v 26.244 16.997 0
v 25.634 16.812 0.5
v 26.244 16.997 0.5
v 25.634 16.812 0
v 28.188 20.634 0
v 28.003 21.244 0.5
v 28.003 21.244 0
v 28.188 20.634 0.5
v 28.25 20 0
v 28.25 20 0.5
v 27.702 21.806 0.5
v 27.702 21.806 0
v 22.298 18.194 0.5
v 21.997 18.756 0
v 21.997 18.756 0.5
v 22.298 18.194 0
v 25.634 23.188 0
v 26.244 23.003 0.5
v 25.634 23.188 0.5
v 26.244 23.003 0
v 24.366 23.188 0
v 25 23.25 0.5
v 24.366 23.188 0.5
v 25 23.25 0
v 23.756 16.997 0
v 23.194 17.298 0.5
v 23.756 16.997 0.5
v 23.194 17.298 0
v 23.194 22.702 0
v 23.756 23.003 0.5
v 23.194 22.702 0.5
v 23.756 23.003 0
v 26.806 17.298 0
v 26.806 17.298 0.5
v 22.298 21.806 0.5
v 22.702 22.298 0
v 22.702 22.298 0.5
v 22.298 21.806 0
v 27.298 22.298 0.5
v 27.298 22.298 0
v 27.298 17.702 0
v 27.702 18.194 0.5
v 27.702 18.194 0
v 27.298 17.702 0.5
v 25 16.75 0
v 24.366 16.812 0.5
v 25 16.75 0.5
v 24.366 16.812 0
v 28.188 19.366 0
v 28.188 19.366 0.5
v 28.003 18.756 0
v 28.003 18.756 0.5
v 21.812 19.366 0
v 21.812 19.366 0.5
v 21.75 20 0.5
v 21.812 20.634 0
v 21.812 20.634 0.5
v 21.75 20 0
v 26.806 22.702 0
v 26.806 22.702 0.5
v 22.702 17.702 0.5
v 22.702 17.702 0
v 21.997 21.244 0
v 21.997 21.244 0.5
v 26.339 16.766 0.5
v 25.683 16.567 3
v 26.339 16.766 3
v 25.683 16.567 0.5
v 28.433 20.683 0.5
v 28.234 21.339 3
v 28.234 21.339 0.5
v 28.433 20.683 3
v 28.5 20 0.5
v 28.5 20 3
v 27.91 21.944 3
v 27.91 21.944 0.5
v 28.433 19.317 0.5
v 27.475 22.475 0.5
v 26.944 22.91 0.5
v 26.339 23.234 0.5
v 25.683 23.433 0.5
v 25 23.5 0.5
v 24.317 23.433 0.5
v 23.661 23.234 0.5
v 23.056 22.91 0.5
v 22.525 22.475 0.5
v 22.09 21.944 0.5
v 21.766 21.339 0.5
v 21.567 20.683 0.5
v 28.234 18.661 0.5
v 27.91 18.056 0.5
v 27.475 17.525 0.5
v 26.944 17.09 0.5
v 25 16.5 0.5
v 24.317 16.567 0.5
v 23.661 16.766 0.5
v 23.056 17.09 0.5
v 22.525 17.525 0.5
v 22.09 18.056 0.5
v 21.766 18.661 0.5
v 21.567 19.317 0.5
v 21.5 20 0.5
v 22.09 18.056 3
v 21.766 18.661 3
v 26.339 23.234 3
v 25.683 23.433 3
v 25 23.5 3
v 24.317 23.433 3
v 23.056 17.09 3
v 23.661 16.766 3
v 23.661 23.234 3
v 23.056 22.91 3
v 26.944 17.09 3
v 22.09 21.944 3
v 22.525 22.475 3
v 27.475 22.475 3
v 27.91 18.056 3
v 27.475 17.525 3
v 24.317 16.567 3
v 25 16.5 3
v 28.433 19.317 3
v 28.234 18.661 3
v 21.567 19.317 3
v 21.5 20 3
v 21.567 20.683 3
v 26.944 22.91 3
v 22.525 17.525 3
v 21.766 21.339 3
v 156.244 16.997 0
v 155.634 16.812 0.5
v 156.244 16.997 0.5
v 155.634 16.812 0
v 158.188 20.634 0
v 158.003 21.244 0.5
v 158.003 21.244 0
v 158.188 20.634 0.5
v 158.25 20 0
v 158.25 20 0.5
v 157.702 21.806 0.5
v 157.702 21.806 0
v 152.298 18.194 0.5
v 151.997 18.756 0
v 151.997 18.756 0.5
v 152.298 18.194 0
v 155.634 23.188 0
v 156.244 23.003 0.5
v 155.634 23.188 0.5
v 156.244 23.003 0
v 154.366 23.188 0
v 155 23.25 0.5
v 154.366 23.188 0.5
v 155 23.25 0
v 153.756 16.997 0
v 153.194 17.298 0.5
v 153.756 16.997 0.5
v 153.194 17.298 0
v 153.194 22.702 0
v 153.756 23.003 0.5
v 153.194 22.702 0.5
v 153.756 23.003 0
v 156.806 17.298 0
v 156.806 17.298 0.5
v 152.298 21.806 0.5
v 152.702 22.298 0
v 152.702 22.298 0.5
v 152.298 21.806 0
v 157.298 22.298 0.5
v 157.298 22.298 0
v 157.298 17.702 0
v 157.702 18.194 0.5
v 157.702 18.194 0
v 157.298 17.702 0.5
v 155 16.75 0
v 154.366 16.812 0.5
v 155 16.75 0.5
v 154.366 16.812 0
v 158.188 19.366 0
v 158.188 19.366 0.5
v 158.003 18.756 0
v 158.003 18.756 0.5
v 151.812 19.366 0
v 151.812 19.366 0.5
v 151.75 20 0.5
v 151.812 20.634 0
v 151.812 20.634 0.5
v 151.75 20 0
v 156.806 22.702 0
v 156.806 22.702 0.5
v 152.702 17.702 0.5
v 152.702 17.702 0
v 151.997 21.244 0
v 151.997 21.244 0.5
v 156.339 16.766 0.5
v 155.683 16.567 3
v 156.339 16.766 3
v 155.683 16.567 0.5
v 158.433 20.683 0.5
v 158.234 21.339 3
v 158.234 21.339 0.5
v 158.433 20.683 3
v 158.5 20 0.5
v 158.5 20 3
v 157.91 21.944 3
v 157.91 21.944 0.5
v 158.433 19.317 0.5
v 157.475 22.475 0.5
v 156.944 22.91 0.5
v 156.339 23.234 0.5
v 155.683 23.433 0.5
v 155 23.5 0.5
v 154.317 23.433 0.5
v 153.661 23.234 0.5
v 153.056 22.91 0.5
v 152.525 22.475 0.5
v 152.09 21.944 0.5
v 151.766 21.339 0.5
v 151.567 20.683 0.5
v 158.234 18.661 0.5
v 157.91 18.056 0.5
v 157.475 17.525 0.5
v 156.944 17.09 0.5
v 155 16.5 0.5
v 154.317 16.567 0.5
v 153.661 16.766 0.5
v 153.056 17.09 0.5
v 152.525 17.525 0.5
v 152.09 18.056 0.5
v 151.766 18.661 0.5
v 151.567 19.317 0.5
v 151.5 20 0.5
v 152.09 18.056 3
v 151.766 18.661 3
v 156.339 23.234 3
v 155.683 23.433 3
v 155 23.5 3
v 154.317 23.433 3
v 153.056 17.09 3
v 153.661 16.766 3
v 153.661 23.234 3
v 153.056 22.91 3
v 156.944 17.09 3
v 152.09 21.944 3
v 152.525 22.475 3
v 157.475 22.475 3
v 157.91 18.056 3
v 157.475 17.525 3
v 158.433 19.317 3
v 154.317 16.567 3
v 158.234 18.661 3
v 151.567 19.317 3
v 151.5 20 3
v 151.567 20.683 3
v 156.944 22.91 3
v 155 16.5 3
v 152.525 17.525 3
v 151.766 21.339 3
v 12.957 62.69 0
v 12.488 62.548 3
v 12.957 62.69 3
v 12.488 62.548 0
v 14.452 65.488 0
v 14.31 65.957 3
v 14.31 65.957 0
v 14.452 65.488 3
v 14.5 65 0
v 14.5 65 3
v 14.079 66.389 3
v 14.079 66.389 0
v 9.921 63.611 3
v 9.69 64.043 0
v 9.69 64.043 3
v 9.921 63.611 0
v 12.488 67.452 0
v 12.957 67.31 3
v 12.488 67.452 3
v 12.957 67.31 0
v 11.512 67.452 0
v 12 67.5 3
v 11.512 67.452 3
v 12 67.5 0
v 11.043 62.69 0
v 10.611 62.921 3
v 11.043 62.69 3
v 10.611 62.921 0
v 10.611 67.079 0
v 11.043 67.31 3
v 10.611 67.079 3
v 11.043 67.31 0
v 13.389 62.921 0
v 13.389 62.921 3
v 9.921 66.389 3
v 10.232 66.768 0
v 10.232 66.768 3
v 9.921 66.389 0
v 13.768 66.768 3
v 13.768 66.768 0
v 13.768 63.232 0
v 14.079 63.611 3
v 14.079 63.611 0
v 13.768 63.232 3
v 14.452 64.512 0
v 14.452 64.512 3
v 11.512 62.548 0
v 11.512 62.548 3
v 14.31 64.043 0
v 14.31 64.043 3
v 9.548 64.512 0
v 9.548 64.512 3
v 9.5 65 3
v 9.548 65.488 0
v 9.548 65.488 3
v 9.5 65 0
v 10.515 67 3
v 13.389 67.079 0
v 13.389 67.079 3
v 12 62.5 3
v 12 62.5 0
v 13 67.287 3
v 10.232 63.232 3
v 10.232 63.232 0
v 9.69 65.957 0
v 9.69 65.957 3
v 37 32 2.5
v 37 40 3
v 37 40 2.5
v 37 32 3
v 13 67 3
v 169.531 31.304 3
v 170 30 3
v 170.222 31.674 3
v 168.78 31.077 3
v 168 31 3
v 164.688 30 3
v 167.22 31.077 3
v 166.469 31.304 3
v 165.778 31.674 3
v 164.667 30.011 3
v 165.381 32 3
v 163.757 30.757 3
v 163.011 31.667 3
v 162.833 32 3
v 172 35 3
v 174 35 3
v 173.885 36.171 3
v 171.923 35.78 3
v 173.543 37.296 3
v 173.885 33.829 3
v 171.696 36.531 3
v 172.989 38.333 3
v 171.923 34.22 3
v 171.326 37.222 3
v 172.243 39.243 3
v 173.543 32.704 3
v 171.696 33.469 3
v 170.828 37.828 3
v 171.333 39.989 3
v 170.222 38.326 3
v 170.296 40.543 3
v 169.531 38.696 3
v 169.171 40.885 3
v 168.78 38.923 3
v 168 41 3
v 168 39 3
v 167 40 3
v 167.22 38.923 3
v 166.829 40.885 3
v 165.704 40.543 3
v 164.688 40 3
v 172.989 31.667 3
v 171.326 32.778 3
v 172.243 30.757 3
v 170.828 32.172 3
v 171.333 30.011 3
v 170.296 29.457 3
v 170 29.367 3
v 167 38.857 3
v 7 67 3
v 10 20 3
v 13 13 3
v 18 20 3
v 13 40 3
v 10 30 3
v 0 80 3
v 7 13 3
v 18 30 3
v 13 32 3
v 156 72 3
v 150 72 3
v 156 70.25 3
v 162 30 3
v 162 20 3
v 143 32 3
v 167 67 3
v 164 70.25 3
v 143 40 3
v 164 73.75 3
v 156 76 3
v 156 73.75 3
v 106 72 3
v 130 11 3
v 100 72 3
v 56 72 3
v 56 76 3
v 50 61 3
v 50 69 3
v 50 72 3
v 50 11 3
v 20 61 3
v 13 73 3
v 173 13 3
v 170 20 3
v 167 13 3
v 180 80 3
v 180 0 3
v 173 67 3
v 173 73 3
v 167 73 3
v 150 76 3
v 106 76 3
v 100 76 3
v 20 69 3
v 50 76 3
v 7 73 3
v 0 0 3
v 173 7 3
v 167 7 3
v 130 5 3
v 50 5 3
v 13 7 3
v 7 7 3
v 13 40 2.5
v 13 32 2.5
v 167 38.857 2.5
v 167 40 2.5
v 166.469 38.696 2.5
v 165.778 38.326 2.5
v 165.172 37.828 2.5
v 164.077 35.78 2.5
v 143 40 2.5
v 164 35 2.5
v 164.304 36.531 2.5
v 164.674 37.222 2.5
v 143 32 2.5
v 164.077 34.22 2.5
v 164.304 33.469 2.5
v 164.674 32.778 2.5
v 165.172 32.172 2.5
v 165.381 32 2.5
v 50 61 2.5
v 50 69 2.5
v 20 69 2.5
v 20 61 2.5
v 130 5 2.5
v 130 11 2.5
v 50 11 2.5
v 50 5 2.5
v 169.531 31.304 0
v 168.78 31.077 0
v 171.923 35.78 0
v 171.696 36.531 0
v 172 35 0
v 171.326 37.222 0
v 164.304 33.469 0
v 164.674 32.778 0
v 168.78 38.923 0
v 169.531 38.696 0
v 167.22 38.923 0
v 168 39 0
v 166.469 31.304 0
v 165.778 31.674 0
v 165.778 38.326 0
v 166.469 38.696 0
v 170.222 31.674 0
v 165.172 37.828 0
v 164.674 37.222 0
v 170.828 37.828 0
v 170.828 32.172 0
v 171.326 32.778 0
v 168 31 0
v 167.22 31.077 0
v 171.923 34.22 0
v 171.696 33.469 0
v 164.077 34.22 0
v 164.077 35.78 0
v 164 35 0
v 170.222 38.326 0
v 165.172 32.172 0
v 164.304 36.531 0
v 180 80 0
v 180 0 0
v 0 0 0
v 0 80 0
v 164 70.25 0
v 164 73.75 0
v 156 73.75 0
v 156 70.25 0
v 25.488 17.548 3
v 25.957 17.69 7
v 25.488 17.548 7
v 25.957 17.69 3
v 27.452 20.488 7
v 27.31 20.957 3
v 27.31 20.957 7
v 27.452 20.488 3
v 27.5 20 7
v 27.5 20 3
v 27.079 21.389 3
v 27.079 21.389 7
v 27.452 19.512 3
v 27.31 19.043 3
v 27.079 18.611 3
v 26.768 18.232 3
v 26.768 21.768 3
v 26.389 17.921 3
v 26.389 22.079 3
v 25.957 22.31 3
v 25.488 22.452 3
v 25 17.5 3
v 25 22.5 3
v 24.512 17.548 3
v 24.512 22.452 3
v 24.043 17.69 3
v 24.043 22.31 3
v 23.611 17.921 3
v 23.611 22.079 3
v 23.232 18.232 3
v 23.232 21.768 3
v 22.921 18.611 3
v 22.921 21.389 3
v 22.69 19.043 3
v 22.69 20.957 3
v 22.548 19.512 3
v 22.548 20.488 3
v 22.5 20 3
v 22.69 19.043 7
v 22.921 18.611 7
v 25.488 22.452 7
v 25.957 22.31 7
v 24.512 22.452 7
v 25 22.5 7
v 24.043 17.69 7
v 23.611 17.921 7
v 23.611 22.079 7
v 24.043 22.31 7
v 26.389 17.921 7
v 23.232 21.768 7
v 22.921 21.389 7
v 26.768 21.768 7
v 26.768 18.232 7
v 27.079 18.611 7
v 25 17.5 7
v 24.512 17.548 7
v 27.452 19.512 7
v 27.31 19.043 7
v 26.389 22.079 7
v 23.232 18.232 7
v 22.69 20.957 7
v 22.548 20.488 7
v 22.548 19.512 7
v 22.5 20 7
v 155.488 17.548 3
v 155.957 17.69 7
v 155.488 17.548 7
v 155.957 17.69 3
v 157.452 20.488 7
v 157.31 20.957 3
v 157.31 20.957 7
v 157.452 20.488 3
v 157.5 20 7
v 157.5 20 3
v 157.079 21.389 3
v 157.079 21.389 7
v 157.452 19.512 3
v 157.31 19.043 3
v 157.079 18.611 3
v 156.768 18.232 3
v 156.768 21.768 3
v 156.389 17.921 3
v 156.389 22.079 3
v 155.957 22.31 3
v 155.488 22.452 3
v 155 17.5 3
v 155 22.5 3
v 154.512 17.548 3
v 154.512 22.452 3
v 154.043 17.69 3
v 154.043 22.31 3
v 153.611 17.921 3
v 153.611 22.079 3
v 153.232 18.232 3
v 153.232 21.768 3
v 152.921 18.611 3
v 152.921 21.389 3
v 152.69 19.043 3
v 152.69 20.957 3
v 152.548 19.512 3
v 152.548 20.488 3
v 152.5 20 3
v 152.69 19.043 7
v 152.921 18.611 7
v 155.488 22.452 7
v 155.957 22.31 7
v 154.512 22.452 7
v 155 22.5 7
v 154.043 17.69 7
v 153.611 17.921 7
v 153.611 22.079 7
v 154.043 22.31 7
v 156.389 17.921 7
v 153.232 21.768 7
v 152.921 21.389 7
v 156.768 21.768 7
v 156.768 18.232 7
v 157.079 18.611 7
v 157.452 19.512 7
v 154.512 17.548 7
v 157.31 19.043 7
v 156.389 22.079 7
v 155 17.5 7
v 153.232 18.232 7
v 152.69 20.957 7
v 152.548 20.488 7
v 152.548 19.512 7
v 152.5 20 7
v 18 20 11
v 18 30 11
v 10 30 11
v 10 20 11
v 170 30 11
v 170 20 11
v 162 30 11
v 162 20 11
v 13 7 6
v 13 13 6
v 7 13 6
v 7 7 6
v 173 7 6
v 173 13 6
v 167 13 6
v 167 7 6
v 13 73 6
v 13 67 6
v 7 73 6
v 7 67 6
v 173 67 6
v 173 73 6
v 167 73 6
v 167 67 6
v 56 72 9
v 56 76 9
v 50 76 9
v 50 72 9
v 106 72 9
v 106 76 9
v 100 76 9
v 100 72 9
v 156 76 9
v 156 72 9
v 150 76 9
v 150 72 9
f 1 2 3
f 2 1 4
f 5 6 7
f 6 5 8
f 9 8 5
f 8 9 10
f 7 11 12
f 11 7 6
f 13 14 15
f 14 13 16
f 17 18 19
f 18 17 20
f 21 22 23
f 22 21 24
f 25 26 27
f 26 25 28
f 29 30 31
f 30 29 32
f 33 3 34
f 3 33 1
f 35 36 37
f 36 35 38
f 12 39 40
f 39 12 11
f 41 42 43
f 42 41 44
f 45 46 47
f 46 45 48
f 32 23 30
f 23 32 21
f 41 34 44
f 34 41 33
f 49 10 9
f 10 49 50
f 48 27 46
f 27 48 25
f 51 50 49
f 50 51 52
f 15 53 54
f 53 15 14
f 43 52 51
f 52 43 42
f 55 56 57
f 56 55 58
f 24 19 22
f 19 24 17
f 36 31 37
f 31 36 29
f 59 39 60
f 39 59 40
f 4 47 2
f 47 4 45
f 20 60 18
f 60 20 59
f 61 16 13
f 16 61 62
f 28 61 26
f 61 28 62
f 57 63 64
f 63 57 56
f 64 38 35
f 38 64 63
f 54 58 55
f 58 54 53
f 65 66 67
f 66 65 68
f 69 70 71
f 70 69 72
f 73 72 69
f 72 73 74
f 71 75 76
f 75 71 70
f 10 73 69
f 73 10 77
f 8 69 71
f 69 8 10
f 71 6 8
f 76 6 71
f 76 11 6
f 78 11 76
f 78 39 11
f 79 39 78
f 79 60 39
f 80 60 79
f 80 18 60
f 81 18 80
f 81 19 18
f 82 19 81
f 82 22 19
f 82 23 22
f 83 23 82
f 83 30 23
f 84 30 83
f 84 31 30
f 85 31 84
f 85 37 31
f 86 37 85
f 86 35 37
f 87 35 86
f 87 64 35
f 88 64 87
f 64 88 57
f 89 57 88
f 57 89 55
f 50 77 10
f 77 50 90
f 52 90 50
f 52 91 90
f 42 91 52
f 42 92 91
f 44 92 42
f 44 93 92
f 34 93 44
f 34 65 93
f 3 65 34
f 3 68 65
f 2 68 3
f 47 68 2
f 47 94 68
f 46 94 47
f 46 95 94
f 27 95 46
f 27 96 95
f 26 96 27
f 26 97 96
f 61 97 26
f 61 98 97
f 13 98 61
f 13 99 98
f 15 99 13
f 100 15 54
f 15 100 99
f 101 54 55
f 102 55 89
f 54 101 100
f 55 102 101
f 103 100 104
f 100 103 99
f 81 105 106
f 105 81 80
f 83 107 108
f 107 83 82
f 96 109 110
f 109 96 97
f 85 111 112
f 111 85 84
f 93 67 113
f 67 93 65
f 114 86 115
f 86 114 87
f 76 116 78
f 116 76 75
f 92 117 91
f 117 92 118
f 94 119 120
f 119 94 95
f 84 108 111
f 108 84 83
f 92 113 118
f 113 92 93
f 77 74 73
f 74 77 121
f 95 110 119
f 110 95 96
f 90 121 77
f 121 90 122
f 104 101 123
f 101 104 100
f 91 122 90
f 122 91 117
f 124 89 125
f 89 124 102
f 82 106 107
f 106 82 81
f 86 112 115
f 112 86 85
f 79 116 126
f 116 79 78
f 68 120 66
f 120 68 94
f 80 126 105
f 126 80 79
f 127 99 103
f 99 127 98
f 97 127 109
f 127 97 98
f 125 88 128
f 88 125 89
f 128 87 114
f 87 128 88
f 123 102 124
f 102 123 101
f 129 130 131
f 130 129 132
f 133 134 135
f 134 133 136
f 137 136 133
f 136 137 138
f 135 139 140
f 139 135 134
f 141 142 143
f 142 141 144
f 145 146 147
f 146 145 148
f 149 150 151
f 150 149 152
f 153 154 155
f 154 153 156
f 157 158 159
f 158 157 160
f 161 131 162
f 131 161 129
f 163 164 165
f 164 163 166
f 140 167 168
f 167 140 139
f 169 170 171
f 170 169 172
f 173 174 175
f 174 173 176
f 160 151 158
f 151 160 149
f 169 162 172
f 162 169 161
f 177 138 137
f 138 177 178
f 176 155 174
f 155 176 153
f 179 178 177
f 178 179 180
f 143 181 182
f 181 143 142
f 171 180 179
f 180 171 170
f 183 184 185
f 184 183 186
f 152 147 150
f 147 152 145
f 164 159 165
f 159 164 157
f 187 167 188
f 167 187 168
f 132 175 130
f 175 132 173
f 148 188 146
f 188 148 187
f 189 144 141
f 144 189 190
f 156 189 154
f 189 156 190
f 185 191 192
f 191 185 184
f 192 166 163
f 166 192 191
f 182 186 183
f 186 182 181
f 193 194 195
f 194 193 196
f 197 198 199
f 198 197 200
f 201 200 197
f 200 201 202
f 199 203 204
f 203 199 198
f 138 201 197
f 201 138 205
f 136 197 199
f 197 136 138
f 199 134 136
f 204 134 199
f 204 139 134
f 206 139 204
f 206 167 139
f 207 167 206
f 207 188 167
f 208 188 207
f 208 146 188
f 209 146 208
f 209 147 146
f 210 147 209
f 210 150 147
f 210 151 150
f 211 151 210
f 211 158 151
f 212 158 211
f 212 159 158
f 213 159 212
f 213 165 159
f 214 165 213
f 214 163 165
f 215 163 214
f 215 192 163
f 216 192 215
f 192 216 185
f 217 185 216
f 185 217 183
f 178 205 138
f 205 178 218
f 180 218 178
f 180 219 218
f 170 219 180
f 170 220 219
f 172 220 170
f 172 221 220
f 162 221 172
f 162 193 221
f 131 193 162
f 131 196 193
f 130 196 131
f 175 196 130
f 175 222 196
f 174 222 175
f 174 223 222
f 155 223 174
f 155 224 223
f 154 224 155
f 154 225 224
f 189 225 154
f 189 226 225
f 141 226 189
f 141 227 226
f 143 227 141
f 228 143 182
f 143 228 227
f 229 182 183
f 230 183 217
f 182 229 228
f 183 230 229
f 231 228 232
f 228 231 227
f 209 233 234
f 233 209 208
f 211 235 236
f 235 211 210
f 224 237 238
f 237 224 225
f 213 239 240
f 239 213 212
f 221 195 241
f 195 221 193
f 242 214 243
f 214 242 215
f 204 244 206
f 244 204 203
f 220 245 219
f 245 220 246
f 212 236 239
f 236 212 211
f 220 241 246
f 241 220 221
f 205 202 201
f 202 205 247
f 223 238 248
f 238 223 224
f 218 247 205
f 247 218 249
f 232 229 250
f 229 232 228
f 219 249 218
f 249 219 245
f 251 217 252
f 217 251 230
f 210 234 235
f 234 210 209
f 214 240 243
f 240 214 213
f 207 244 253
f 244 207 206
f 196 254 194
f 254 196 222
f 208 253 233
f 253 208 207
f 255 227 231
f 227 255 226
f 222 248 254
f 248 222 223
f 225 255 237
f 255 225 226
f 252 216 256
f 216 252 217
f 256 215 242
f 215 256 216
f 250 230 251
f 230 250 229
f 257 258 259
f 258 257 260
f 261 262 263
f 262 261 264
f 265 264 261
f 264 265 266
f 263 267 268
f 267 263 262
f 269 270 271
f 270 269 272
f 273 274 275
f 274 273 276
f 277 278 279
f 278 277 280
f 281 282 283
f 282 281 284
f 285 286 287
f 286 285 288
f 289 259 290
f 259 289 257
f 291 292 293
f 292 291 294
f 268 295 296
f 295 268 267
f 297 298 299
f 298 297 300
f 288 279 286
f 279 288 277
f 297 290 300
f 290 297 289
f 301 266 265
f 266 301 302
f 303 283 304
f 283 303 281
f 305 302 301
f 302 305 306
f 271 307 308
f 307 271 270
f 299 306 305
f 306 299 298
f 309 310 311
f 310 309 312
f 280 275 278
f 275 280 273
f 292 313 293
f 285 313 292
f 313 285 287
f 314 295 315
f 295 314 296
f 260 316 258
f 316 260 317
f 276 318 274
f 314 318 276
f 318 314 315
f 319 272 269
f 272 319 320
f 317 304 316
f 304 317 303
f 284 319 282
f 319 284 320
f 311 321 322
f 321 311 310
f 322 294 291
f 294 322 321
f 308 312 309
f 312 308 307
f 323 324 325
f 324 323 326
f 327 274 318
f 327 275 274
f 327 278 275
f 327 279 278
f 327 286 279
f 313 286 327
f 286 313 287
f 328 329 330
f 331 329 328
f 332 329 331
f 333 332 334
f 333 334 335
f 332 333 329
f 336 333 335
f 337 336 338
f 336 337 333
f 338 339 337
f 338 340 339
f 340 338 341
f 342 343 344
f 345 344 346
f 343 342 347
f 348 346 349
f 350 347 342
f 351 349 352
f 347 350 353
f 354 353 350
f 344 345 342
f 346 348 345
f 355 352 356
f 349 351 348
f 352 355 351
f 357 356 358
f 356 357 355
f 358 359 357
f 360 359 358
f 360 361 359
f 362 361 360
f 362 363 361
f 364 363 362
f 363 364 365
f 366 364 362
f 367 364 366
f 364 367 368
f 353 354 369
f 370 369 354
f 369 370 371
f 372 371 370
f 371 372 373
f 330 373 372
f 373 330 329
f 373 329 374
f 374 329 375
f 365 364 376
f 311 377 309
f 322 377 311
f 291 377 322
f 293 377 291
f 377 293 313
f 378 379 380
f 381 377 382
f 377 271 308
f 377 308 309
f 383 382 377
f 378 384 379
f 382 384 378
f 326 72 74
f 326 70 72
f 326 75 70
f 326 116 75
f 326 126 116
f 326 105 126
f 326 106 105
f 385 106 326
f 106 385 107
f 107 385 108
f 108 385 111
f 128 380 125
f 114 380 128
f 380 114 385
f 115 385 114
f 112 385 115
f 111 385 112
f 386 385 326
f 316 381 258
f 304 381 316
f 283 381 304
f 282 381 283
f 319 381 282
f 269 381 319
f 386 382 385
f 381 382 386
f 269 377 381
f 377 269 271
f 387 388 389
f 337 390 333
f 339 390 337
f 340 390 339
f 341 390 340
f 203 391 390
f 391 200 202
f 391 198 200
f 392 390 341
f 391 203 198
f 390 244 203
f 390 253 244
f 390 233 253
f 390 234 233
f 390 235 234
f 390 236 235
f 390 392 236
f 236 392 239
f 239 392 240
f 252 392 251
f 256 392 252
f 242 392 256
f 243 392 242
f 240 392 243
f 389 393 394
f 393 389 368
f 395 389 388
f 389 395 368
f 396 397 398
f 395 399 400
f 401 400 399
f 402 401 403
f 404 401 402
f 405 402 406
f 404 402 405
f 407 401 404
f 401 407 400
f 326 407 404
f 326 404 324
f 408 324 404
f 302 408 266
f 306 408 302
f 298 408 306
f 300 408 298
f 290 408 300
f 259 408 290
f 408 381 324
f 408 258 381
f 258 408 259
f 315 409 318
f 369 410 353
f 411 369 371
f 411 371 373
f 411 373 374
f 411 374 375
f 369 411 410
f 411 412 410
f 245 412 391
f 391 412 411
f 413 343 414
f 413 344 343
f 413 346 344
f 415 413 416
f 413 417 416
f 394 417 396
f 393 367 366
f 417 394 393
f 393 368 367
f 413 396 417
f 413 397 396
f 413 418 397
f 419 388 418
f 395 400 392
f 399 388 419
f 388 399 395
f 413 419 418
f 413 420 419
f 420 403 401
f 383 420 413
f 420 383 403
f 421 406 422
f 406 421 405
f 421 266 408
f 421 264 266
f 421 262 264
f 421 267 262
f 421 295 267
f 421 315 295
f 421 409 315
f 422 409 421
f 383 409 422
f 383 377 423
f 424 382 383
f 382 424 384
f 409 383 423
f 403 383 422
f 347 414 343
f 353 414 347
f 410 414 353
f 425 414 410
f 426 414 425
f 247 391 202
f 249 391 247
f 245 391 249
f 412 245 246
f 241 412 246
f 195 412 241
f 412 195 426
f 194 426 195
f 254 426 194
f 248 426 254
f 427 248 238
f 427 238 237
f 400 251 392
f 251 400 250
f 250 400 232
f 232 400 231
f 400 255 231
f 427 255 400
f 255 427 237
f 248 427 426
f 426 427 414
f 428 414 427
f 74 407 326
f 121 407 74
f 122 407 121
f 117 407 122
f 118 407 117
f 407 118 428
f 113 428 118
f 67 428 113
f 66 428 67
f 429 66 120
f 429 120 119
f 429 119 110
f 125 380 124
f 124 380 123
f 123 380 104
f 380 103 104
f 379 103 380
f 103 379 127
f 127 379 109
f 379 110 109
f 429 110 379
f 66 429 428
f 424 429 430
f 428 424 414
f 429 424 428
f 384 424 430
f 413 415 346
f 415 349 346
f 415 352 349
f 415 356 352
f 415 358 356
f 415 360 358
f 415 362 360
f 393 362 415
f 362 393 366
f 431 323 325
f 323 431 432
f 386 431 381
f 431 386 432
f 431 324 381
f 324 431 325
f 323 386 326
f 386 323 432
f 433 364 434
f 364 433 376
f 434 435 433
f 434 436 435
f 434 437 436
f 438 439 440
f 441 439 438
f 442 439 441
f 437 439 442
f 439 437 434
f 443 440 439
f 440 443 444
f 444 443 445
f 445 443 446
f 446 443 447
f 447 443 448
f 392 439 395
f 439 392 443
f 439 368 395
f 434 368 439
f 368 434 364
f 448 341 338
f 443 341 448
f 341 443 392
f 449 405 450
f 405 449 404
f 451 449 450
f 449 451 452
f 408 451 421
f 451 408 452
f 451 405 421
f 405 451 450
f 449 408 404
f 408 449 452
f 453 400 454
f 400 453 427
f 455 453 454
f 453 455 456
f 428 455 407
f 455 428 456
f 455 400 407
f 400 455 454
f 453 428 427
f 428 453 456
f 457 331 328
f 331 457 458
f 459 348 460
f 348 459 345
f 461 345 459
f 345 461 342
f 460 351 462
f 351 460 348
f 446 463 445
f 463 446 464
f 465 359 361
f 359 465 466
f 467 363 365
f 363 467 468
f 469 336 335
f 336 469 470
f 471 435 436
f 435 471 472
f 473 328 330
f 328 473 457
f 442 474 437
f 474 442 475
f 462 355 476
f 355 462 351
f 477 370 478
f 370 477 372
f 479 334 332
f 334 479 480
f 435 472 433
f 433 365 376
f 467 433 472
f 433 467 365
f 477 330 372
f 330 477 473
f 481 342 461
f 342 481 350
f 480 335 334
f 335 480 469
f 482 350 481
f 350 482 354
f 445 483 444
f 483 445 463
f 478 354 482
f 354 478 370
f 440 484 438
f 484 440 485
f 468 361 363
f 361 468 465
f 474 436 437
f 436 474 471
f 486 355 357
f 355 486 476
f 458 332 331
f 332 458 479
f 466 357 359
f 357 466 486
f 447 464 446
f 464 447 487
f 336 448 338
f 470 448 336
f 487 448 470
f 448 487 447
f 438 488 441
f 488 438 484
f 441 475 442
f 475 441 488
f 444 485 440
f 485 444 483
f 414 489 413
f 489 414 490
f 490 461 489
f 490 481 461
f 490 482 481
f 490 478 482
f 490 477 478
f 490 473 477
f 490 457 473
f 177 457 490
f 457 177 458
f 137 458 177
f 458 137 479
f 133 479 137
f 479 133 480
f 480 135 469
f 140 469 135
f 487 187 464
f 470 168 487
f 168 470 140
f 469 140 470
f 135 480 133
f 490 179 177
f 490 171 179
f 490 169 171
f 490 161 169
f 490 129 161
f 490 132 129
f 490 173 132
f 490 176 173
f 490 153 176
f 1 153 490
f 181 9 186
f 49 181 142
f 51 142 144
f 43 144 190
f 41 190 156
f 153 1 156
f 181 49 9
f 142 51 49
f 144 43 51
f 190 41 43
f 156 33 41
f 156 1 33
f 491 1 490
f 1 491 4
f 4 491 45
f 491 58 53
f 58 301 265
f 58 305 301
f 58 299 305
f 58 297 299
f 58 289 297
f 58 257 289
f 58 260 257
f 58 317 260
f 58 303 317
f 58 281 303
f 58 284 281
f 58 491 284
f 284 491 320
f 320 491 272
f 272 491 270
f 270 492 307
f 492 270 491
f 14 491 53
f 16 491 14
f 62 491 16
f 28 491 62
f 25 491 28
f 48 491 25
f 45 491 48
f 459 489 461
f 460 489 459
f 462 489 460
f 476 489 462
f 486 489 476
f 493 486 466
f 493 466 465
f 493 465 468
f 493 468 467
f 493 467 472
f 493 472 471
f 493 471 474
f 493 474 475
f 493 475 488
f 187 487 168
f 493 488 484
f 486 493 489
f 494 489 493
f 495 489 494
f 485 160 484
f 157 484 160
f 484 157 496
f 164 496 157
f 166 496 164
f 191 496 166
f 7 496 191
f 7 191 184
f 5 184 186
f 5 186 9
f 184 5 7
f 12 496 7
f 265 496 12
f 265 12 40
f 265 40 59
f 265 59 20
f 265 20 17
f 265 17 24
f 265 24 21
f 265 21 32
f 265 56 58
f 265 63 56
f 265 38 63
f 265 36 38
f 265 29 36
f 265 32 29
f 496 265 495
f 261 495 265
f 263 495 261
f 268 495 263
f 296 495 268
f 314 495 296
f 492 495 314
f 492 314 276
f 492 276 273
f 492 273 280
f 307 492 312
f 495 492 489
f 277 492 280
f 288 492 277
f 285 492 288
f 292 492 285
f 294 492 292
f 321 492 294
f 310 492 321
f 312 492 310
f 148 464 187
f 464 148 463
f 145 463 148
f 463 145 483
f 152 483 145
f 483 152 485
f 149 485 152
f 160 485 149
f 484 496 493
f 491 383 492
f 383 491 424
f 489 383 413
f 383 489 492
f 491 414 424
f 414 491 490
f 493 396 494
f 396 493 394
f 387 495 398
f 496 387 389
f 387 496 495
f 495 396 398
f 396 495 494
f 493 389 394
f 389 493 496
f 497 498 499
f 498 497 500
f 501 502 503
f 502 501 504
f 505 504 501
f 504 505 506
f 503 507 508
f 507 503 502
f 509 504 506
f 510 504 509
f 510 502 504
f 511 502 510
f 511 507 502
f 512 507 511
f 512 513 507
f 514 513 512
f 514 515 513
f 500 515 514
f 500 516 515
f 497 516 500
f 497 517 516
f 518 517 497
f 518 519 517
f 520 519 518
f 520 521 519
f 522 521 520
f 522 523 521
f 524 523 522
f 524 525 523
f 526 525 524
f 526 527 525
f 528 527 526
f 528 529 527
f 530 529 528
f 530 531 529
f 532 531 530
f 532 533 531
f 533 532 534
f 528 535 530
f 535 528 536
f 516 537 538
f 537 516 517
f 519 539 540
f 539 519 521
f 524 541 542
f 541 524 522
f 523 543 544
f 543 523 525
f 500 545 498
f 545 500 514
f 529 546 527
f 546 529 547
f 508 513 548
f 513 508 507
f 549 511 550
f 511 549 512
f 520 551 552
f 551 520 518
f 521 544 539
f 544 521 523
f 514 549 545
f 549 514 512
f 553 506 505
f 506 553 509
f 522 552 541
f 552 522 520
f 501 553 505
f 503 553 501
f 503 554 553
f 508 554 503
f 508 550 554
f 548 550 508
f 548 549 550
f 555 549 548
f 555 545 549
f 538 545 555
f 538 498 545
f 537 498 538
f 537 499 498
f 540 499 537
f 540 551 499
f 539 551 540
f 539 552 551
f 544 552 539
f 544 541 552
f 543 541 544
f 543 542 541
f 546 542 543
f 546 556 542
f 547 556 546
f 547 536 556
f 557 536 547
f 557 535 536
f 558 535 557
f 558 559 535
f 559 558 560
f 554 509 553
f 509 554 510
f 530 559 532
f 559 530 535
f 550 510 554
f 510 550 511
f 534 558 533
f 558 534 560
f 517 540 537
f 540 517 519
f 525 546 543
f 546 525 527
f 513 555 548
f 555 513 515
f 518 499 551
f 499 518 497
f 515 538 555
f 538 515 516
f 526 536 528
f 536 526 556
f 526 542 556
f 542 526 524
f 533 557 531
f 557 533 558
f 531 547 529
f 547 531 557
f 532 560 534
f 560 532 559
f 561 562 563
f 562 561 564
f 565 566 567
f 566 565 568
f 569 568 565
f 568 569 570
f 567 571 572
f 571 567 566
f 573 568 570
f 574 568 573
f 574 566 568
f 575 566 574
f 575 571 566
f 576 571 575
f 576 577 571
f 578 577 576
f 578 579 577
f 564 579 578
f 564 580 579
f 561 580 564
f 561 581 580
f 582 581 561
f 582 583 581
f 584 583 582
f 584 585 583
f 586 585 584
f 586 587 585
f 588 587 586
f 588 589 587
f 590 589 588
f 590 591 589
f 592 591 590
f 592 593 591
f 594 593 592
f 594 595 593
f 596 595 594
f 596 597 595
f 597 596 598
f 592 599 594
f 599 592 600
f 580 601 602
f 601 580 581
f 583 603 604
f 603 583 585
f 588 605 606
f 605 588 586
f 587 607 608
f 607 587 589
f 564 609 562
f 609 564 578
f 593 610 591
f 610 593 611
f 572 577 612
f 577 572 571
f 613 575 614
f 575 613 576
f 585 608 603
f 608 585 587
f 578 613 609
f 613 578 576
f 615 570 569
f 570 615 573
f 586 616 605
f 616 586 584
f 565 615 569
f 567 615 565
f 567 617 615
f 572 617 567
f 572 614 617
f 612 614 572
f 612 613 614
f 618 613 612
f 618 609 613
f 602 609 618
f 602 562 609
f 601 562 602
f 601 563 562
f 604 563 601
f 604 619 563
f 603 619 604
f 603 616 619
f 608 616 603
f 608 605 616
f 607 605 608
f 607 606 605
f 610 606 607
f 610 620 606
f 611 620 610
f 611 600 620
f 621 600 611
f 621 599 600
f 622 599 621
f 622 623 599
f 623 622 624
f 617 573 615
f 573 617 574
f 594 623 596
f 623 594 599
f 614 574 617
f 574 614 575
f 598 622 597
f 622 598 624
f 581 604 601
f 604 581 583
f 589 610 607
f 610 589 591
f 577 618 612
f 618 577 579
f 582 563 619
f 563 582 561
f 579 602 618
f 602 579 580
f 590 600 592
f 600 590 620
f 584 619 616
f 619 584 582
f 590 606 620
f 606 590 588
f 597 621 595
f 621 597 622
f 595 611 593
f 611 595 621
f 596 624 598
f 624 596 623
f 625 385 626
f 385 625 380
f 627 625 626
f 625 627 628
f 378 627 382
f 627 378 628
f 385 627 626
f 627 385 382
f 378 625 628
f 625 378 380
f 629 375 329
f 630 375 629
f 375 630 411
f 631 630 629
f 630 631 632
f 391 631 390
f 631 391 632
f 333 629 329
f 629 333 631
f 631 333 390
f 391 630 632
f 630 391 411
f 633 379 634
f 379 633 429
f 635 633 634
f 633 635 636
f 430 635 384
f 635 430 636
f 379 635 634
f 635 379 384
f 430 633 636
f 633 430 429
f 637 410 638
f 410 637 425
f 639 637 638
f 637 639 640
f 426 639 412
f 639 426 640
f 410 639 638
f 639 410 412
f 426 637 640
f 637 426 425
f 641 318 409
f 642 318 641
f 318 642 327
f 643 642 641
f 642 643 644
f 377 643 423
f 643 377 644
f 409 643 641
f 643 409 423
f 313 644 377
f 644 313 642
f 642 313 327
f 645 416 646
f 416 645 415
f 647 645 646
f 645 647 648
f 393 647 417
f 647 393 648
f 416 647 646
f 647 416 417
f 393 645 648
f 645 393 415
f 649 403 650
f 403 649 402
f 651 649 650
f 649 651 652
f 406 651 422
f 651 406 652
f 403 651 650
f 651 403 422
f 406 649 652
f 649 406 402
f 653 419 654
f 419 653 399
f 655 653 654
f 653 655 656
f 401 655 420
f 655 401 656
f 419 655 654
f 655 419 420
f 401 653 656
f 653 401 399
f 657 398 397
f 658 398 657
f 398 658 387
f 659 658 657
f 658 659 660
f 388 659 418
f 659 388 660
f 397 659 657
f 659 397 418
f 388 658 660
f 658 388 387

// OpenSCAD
// INTEGRATED ANTENNA ANALYZER - RF CONNECTOR FRONT PANEL
// Front face of analyzer: SMA DUT/REF ports, display, controls
// Panel: 180mm × 80mm (front half of main enclosure)

panel_length = 180;    // X-axis (same as main enclosure)
panel_height = 80;     // Y-axis (front-back depth)
panel_thickness = 3;   // Material thickness

// SMA connector specifications
sma_connector_diameter = 7;   // Outer diameter of SMA barrel
sma_hole_diameter = 6.5;      // Hole diameter (slightly smaller for tight fit)
sma_thread_depth = 8;         // Depth of thread engagement

// Port positions (DUT and REF, spaced apart for easy cable access)
dut_port_x = 25;              // 25mm from left edge
ref_port_x = panel_length - 25; // 25mm from right edge (symmetric)
port_y = 20;                  // 20mm from top (recessed below display)
port_z = panel_thickness / 2; // Center of panel thickness

// LED status indicator
led_diameter = 5;              // 5mm LED
led_x = 12;
led_y = 65;

// Label engraving (for clarity)
label_depth = 0.5;            // Shallow engraving

module rf_connector_panel_base() {
  // Flat panel for mounting on front of main enclosure
  cube([panel_length, panel_height, panel_thickness]);
}

module sma_port_dut() {
  // DUT (Device Under Test) measurement port
  // SMA connector flush-mount on front surface

  translate([dut_port_x, port_y, -0.5])
    cylinder(h = panel_thickness + 1, d = sma_hole_diameter, $fn = 32);

  // Brass insert recess (allows threaded SMA mounting)
  translate([dut_port_x, port_y, 0.5])
    cylinder(h = sma_thread_depth, d = sma_connector_diameter, $fn = 32);
}

module sma_port_ref() {
  // Reference (reflection reference) measurement port
  // SMA connector, paired with DUT for directional measurement

  translate([ref_port_x, port_y, -0.5])
    cylinder(h = panel_thickness + 1, d = sma_hole_diameter, $fn = 32);

  // Brass insert recess
  translate([ref_port_x, port_y, 0.5])
    cylinder(h = sma_thread_depth, d = sma_connector_diameter, $fn = 32);
}

module sma_brass_alignment_feature() {
  // Small alignment bosses to center brass insert guides
  // Ensures SMA connectors align with internal PCB SMA receptacles

  guide_radius = 2.5;  // 5mm diameter guide
  guide_height = 4;

  // At DUT port
  translate([dut_port_x, port_y, panel_thickness])
    cylinder(h = guide_height, r = guide_radius, $fn = 32);

  // At REF port
  translate([ref_port_x, port_y, panel_thickness])
    cylinder(h = guide_height, r = guide_radius, $fn = 32);
}

module led_status_indicator() {
  // Bicolor LED (red/green) for charging, measurement, and warning status
  // Mounted on front panel for visibility

  translate([led_x, led_y, -0.5])
    cylinder(h = panel_thickness + 1, d = led_diameter, $fn = 32);

  // Internal LED housing (light pipe to surface)
  translate([led_x, led_y, panel_thickness])
    cylinder(h = 3, d = 4, $fn = 32);
}

module label_engraving() {
  // Text labels (engraved shallow into panel)
  // Note: OpenSCAD cannot render text directly, but we can position guides

  // DUT label area (below port)
  // Engraving depth: 0.5mm for legibility without weakening panel
  // Position: centered above DUT port
  translate([dut_port_x - 12, port_y + 12, panel_thickness - label_depth])
    cube([24, 8, label_depth]);

  // REF label area
  translate([ref_port_x - 12, port_y + 12, panel_thickness - label_depth])
    cube([24, 8, label_depth]);

  // LED status legend (to the side of LED)
  translate([led_x + 8, led_y - 4, panel_thickness - label_depth])
    cube([30, 8, label_depth]);

  // Model name/identifier
  translate([panel_length / 2 - 40, 5, panel_thickness - label_depth])
    cube([80, 6, label_depth]);
}

module connector_strain_relief_bosses() {
  // Small bosses to guide and protect SMA cable connectors
  // Prevents cable stress at connection point

  boss_height = 8;
  boss_width = 10;

  // DUT cable boss (lateral support)
  translate([dut_port_x - 15, port_y, panel_thickness])
    cube([8, boss_width, boss_height]);

  // REF cable boss (lateral support)
  translate([ref_port_x + 7, port_y, panel_thickness])
    cube([8, boss_width, boss_height]);
}

module mounting_tabs_for_enclosure() {
  // Alignment tabs that interface with main enclosure recessed display opening
  // Ensures panel sits perfectly flush with front of analyzer

  tab_width = 6;
  tab_depth = 5;
  tab_height = 3;

  // Corner tabs (four positions)
  corners = [
    [10, 10],
    [panel_length - 10, 10],
    [10, panel_height - 10],
    [panel_length - 10, panel_height - 10]
  ];

  for (corner = corners) {
    translate([corner[0] - tab_width/2, corner[1] - tab_width/2, panel_thickness])
      cube([tab_width, tab_width, tab_height]);
  }
}

module cable_routing_clip() {
  // Clip to route DUT/REF coax cables neatly along panel edge
  // Prevents cables from interfering with display or internal components

  clip_width = 4;
  clip_height = 6;

  // Along bottom edge, spaced for cable management
  translate([50, panel_height - 8, panel_thickness])
    cube([6, clip_width, clip_height]);

  translate([100, panel_height - 8, panel_thickness])
    cube([6, clip_width, clip_height]);

  translate([150, panel_height - 8, panel_thickness])
    cube([6, clip_width, clip_height]);
}

module usb_charging_cutout() {
  // Micro-USB or USB-C port for charging
  // Positioned on one side edge for easy access

  usb_width = 8;
  usb_height = 3.5;
  usb_x = panel_length - 20;
  usb_y = panel_height - 8;

  translate([usb_x - usb_width/2, usb_y - usb_height/2, -0.5])
    cube([usb_width, usb_height, panel_thickness + 1]);
}

module rotary_encoder_shaft_guide() {
  // Small bore hole to guide rotary encoder shaft
  // Encoder mounted on rear PCB, shaft protrudes to front panel

  encoder_x = panel_length - 12;
  encoder_y = 35;
  shaft_diameter = 8;  // 7mm shaft, 1mm clearance

  translate([encoder_x, encoder_y, -0.5])
    cylinder(h = panel_thickness + 1, d = shaft_diameter, $fn = 32);

  // Knob mounting surface (slight recess for knob base)
  translate([encoder_x, encoder_y, panel_thickness])
    cylinder(h = 2, d = 12, $fn = 32);
}

module assembly() {
  // Main panel assembly
  difference() {
    // Base panel
    rf_connector_panel_base();

    // Remove all cutouts and engraving
    sma_port_dut();
    sma_port_ref();
    led_status_indicator();
    label_engraving();
    usb_charging_cutout();
    rotary_encoder_shaft_guide();
  }

  // Add internal features (alignment guides, bosses, clips)
  sma_brass_alignment_feature();
  connector_strain_relief_bosses();
  mounting_tabs_for_enclosure();
  cable_routing_clip();
}

// RENDER ASSEMBLY
assembly();

// Show connector positions for assembly reference
%translate([dut_port_x, port_y, 0]) cylinder(h=20, d=6, $fn=32);    // DUT port
%translate([ref_port_x, port_y, 0]) cylinder(h=20, d=6, $fn=32);    // REF port
%translate([led_x, led_y, 0]) cylinder(h=10, d=led_diameter, $fn=32); // LED

// NOTES FOR MANUFACTURING:
// 1. Print in opaque PETG (black preferred for professional appearance)
// 2. Layer height: 0.15mm for dimensional accuracy
// 3. Orientation: print with face UP to minimize supports
// 4. Support material: needed only under SMA barrel overhangs
// 5. Post-processing: sand to 120 grit, optionally paint with acrylic
// 6. Assembly:
//    a. Press brass SMA inserts into connector recesses (with epoxy)
//    b. Screw SMA connectors through panel into brass inserts
//    c. Route coax cables through internal clips to minimize bending
//    d. Mount panel to main enclosure using alignment tabs
// 7. Sealing: apply silicone gasket around SMA connectors (optional, improves weather resistance)
// 8. Labeling: use vinyl stickers or silk-screen printing for text labels
// 9. Cable jacket: use color-coded coax (red=DUT, black=REF) for field clarity
